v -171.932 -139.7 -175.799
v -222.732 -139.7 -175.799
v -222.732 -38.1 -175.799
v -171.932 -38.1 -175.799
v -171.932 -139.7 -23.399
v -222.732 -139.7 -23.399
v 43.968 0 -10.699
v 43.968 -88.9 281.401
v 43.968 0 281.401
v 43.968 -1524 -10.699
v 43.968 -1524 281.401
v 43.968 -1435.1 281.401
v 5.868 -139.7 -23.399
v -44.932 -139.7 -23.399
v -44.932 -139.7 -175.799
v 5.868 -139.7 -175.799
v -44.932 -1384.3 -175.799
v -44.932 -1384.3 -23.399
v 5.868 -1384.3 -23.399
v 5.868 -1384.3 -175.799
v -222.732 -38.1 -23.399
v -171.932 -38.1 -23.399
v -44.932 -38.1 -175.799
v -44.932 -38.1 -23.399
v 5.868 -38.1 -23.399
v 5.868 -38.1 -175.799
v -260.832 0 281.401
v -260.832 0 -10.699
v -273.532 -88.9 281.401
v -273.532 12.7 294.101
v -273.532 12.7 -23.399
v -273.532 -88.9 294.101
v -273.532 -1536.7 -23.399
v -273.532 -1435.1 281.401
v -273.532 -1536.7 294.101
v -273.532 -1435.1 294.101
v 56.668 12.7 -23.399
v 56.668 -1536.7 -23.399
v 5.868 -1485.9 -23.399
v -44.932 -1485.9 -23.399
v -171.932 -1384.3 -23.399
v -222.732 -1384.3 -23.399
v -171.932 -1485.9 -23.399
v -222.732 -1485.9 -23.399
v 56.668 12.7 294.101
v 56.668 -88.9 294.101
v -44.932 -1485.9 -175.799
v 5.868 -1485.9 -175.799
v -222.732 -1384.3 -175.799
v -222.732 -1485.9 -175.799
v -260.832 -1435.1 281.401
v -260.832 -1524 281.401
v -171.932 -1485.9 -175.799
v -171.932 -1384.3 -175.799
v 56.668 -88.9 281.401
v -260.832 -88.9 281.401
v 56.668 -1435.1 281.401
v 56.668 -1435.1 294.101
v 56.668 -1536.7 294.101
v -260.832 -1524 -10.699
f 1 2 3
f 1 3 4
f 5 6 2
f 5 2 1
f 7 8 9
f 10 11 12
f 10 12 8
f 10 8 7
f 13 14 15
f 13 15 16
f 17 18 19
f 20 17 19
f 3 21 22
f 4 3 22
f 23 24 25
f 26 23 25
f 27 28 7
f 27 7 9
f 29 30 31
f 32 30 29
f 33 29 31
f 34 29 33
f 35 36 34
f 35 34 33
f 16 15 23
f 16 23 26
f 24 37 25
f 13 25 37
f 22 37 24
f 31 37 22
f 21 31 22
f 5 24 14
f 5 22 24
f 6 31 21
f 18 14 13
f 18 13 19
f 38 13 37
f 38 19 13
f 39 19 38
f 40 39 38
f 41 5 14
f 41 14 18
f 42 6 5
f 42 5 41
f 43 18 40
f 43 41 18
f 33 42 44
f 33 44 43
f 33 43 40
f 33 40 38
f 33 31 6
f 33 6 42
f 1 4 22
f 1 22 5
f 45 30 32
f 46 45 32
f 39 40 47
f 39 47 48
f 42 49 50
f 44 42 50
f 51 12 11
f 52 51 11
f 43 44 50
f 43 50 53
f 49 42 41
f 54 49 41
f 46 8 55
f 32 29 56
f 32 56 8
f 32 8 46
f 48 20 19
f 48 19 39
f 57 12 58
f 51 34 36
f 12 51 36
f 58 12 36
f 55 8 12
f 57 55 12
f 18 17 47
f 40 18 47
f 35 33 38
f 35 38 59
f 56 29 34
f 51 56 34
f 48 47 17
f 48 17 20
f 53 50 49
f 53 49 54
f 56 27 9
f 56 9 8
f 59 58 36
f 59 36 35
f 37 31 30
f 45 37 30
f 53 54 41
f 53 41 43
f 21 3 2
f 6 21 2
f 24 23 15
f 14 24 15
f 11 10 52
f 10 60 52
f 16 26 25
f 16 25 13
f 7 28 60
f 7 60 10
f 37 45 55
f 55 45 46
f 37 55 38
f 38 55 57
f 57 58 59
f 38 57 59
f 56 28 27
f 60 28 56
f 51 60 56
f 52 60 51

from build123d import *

# Parameters (mm, degrees)
F0_W     = 304.8
F0_H     = 12.7
F1_DEPTH = 1524
F3_DEPTH = 1524
F4_W     = 12.7
F4_H     = 304.8
F5_DEPTH = 330.2
F6_W     = 101.6
F6_H     = 12.7
F7_DEPTH = 330.2
F8_W     = 50.8
F8_H     = 101.6
F9_DEPTH = 152.4


with BuildPart() as f1:
    # F0 (on Front) → F1 (new body)
    with BuildSketch(Plane.XZ):
        with Locations((-108.432242626, -17.0491518617)):
            Rectangle(F0_W, F0_H)
    extrude(amount=F1_DEPTH)

    # F2 (on face) → F3 (join)
    with BuildSketch(Plane.XZ.offset(1524)):
        Polygon((-273.532242626, -23.3991518617), (-260.832242626, -23.3991518617), (-260.832242626, -10.6991518617), (-260.832242626, 281.4008481383), (-273.532242626, 281.4008481383), align=None)
        Polygon((43.967757374, -10.6991518617), (43.967757374, -23.3991518617), (56.667757374, -23.3991518617), (56.667757374, 281.4008481383), (43.967757374, 281.4008481383), align=None)
    extrude(amount=-F3_DEPTH)

    # F4 (on face) → F5 (join)
    with BuildSketch(Plane(origin=(-273.532242626, 0, 0), x_dir=(0, -1, 0), z_dir=(-1, 0, 0))):
        with Locations((-6.35, 129.0008481383)):
            Rectangle(F4_W, F4_H)
        with Locations((1530.35, 129.0008481383)):
            Rectangle(F4_W, F4_H)
    extrude(amount=-F5_DEPTH)

    # F6 (on face) → F7 (join)
    with BuildSketch(Plane(origin=(-273.532242626, 0, 0), x_dir=(0, -1, 0), z_dir=(-1, 0, 0))):
        with Locations((1485.9, 287.7508481383)):
            Rectangle(F6_W, F6_H)
        with Locations((38.1, 287.7508481383)):
            Rectangle(F6_W, F6_H)
    extrude(amount=-F7_DEPTH)

    # F8 (on face) → F9 (join)
    with BuildSketch(Plane(origin=(0, 0, -23.3991518617), x_dir=(1, 0, 0), z_dir=(0, 0, -1))):
        with Locations((-197.332242626, 88.9)):
            Rectangle(F8_W, F8_H)
        with Locations((-19.532242626, 88.9)):
            Rectangle(F8_W, F8_H)
        with Locations((-197.332242626, 1435.1)):
            Rectangle(F8_W, F8_H)
        with Locations((-19.532242626, 1435.1)):
            Rectangle(F8_W, F8_H)
    extrude(amount=F9_DEPTH)


solid = f1.part
